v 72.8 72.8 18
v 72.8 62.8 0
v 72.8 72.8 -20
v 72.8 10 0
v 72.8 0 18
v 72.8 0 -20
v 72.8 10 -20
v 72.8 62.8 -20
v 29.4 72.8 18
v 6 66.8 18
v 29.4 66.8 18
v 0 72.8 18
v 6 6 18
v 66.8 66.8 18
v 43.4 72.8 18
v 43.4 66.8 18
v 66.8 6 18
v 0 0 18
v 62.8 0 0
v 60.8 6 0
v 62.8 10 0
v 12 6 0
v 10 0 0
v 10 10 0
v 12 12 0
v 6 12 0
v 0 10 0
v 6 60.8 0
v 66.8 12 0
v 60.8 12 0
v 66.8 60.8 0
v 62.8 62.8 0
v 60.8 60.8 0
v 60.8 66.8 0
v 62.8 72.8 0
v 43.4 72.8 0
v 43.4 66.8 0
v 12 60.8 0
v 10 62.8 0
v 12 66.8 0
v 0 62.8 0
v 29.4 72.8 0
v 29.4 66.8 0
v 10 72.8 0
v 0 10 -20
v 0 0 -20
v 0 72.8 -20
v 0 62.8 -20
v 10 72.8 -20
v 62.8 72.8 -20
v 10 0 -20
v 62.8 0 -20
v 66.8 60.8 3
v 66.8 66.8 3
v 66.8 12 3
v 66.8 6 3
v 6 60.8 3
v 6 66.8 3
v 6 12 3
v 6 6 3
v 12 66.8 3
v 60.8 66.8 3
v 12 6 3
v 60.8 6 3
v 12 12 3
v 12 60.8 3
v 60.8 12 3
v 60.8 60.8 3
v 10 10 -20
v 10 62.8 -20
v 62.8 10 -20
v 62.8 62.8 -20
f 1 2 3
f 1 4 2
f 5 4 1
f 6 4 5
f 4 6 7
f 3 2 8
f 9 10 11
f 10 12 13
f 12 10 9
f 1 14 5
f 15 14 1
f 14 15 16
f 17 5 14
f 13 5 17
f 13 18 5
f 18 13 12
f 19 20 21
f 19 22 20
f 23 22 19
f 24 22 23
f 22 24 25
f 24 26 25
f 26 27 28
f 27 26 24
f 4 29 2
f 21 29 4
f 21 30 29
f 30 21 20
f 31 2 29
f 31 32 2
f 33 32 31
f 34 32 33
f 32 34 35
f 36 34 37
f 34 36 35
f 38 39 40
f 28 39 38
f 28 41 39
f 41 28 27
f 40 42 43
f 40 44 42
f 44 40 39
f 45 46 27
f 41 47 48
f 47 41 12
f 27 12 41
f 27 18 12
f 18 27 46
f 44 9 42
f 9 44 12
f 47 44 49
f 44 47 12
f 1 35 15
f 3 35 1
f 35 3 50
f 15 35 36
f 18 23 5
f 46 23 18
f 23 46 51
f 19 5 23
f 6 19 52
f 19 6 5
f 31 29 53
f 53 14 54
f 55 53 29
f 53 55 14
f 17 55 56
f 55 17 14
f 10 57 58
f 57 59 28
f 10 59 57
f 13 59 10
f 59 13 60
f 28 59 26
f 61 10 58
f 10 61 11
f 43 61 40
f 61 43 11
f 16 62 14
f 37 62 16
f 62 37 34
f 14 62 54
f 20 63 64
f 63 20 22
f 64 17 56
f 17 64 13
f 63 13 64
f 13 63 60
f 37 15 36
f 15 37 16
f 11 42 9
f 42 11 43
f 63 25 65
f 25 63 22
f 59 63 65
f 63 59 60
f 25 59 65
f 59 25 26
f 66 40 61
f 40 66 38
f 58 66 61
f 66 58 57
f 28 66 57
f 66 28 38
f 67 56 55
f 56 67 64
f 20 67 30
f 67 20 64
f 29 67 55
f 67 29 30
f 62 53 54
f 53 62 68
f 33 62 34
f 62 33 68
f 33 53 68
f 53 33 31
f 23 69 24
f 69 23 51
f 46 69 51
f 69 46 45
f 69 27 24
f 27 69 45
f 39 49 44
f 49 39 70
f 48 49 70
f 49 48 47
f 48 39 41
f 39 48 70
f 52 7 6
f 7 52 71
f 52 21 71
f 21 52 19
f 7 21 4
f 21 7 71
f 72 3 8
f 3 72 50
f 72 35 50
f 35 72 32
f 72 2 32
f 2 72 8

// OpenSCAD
// AETHER M8 thermal-coupon holder - generated by cad/make_coupon_holder.py
// Edit the parameters, then: openscad -o coupon_holder.stl coupon_holder.scad
// This file is the authoritative geometry. The generated ASCII STL is a convenience
// copy built from non-interpenetrating boxes; OpenSCAD's union() is what makes a true
// manifold.

coupon_x     = 60.0;
coupon_y     = 60.0;
coupon_z     = 10.0;
clearance    = 0.4;
rail         = 6.0;
frame_h      = 18.0;
pad          = 6.0;
pad_h        = 3.0;
leg          = 10.0;
leg_h        = 20.0;
wire_gap     = 14.0;

opening_x = coupon_x + 2 * clearance;
opening_y = coupon_y + 2 * clearance;
outer_x   = opening_x + 2 * rail;
outer_y   = opening_y + 2 * rail;

module frame() {
    difference() {
        cube([outer_x, outer_y, frame_h]);
        // through opening: BOTH faces of the coupon must see air
        translate([rail, rail, -1])
            cube([opening_x, opening_y, frame_h + 2]);
        // wire exit in the +Y rail
        translate([(outer_x - wire_gap) / 2, outer_y - rail - 1, -1])
            cube([wire_gap, rail + 2, frame_h + 2]);
    }
}

module pads() {
    for (px = [rail, outer_x - rail - pad])
        for (py = [rail, outer_y - rail - pad])
            translate([px, py, 0]) cube([pad, pad, pad_h]);
}

module legs() {
    for (px = [0, outer_x - leg])
        for (py = [0, outer_y - leg])
            translate([px, py, -leg_h]) cube([leg, leg, leg_h]);
}

union() { frame(); pads(); legs(); }

// Reference only - not printed. Uncomment to check the coupon fits.
// %translate([rail + clearance, rail + clearance, pad_h])
//     cube([coupon_x, coupon_y, coupon_z]);
